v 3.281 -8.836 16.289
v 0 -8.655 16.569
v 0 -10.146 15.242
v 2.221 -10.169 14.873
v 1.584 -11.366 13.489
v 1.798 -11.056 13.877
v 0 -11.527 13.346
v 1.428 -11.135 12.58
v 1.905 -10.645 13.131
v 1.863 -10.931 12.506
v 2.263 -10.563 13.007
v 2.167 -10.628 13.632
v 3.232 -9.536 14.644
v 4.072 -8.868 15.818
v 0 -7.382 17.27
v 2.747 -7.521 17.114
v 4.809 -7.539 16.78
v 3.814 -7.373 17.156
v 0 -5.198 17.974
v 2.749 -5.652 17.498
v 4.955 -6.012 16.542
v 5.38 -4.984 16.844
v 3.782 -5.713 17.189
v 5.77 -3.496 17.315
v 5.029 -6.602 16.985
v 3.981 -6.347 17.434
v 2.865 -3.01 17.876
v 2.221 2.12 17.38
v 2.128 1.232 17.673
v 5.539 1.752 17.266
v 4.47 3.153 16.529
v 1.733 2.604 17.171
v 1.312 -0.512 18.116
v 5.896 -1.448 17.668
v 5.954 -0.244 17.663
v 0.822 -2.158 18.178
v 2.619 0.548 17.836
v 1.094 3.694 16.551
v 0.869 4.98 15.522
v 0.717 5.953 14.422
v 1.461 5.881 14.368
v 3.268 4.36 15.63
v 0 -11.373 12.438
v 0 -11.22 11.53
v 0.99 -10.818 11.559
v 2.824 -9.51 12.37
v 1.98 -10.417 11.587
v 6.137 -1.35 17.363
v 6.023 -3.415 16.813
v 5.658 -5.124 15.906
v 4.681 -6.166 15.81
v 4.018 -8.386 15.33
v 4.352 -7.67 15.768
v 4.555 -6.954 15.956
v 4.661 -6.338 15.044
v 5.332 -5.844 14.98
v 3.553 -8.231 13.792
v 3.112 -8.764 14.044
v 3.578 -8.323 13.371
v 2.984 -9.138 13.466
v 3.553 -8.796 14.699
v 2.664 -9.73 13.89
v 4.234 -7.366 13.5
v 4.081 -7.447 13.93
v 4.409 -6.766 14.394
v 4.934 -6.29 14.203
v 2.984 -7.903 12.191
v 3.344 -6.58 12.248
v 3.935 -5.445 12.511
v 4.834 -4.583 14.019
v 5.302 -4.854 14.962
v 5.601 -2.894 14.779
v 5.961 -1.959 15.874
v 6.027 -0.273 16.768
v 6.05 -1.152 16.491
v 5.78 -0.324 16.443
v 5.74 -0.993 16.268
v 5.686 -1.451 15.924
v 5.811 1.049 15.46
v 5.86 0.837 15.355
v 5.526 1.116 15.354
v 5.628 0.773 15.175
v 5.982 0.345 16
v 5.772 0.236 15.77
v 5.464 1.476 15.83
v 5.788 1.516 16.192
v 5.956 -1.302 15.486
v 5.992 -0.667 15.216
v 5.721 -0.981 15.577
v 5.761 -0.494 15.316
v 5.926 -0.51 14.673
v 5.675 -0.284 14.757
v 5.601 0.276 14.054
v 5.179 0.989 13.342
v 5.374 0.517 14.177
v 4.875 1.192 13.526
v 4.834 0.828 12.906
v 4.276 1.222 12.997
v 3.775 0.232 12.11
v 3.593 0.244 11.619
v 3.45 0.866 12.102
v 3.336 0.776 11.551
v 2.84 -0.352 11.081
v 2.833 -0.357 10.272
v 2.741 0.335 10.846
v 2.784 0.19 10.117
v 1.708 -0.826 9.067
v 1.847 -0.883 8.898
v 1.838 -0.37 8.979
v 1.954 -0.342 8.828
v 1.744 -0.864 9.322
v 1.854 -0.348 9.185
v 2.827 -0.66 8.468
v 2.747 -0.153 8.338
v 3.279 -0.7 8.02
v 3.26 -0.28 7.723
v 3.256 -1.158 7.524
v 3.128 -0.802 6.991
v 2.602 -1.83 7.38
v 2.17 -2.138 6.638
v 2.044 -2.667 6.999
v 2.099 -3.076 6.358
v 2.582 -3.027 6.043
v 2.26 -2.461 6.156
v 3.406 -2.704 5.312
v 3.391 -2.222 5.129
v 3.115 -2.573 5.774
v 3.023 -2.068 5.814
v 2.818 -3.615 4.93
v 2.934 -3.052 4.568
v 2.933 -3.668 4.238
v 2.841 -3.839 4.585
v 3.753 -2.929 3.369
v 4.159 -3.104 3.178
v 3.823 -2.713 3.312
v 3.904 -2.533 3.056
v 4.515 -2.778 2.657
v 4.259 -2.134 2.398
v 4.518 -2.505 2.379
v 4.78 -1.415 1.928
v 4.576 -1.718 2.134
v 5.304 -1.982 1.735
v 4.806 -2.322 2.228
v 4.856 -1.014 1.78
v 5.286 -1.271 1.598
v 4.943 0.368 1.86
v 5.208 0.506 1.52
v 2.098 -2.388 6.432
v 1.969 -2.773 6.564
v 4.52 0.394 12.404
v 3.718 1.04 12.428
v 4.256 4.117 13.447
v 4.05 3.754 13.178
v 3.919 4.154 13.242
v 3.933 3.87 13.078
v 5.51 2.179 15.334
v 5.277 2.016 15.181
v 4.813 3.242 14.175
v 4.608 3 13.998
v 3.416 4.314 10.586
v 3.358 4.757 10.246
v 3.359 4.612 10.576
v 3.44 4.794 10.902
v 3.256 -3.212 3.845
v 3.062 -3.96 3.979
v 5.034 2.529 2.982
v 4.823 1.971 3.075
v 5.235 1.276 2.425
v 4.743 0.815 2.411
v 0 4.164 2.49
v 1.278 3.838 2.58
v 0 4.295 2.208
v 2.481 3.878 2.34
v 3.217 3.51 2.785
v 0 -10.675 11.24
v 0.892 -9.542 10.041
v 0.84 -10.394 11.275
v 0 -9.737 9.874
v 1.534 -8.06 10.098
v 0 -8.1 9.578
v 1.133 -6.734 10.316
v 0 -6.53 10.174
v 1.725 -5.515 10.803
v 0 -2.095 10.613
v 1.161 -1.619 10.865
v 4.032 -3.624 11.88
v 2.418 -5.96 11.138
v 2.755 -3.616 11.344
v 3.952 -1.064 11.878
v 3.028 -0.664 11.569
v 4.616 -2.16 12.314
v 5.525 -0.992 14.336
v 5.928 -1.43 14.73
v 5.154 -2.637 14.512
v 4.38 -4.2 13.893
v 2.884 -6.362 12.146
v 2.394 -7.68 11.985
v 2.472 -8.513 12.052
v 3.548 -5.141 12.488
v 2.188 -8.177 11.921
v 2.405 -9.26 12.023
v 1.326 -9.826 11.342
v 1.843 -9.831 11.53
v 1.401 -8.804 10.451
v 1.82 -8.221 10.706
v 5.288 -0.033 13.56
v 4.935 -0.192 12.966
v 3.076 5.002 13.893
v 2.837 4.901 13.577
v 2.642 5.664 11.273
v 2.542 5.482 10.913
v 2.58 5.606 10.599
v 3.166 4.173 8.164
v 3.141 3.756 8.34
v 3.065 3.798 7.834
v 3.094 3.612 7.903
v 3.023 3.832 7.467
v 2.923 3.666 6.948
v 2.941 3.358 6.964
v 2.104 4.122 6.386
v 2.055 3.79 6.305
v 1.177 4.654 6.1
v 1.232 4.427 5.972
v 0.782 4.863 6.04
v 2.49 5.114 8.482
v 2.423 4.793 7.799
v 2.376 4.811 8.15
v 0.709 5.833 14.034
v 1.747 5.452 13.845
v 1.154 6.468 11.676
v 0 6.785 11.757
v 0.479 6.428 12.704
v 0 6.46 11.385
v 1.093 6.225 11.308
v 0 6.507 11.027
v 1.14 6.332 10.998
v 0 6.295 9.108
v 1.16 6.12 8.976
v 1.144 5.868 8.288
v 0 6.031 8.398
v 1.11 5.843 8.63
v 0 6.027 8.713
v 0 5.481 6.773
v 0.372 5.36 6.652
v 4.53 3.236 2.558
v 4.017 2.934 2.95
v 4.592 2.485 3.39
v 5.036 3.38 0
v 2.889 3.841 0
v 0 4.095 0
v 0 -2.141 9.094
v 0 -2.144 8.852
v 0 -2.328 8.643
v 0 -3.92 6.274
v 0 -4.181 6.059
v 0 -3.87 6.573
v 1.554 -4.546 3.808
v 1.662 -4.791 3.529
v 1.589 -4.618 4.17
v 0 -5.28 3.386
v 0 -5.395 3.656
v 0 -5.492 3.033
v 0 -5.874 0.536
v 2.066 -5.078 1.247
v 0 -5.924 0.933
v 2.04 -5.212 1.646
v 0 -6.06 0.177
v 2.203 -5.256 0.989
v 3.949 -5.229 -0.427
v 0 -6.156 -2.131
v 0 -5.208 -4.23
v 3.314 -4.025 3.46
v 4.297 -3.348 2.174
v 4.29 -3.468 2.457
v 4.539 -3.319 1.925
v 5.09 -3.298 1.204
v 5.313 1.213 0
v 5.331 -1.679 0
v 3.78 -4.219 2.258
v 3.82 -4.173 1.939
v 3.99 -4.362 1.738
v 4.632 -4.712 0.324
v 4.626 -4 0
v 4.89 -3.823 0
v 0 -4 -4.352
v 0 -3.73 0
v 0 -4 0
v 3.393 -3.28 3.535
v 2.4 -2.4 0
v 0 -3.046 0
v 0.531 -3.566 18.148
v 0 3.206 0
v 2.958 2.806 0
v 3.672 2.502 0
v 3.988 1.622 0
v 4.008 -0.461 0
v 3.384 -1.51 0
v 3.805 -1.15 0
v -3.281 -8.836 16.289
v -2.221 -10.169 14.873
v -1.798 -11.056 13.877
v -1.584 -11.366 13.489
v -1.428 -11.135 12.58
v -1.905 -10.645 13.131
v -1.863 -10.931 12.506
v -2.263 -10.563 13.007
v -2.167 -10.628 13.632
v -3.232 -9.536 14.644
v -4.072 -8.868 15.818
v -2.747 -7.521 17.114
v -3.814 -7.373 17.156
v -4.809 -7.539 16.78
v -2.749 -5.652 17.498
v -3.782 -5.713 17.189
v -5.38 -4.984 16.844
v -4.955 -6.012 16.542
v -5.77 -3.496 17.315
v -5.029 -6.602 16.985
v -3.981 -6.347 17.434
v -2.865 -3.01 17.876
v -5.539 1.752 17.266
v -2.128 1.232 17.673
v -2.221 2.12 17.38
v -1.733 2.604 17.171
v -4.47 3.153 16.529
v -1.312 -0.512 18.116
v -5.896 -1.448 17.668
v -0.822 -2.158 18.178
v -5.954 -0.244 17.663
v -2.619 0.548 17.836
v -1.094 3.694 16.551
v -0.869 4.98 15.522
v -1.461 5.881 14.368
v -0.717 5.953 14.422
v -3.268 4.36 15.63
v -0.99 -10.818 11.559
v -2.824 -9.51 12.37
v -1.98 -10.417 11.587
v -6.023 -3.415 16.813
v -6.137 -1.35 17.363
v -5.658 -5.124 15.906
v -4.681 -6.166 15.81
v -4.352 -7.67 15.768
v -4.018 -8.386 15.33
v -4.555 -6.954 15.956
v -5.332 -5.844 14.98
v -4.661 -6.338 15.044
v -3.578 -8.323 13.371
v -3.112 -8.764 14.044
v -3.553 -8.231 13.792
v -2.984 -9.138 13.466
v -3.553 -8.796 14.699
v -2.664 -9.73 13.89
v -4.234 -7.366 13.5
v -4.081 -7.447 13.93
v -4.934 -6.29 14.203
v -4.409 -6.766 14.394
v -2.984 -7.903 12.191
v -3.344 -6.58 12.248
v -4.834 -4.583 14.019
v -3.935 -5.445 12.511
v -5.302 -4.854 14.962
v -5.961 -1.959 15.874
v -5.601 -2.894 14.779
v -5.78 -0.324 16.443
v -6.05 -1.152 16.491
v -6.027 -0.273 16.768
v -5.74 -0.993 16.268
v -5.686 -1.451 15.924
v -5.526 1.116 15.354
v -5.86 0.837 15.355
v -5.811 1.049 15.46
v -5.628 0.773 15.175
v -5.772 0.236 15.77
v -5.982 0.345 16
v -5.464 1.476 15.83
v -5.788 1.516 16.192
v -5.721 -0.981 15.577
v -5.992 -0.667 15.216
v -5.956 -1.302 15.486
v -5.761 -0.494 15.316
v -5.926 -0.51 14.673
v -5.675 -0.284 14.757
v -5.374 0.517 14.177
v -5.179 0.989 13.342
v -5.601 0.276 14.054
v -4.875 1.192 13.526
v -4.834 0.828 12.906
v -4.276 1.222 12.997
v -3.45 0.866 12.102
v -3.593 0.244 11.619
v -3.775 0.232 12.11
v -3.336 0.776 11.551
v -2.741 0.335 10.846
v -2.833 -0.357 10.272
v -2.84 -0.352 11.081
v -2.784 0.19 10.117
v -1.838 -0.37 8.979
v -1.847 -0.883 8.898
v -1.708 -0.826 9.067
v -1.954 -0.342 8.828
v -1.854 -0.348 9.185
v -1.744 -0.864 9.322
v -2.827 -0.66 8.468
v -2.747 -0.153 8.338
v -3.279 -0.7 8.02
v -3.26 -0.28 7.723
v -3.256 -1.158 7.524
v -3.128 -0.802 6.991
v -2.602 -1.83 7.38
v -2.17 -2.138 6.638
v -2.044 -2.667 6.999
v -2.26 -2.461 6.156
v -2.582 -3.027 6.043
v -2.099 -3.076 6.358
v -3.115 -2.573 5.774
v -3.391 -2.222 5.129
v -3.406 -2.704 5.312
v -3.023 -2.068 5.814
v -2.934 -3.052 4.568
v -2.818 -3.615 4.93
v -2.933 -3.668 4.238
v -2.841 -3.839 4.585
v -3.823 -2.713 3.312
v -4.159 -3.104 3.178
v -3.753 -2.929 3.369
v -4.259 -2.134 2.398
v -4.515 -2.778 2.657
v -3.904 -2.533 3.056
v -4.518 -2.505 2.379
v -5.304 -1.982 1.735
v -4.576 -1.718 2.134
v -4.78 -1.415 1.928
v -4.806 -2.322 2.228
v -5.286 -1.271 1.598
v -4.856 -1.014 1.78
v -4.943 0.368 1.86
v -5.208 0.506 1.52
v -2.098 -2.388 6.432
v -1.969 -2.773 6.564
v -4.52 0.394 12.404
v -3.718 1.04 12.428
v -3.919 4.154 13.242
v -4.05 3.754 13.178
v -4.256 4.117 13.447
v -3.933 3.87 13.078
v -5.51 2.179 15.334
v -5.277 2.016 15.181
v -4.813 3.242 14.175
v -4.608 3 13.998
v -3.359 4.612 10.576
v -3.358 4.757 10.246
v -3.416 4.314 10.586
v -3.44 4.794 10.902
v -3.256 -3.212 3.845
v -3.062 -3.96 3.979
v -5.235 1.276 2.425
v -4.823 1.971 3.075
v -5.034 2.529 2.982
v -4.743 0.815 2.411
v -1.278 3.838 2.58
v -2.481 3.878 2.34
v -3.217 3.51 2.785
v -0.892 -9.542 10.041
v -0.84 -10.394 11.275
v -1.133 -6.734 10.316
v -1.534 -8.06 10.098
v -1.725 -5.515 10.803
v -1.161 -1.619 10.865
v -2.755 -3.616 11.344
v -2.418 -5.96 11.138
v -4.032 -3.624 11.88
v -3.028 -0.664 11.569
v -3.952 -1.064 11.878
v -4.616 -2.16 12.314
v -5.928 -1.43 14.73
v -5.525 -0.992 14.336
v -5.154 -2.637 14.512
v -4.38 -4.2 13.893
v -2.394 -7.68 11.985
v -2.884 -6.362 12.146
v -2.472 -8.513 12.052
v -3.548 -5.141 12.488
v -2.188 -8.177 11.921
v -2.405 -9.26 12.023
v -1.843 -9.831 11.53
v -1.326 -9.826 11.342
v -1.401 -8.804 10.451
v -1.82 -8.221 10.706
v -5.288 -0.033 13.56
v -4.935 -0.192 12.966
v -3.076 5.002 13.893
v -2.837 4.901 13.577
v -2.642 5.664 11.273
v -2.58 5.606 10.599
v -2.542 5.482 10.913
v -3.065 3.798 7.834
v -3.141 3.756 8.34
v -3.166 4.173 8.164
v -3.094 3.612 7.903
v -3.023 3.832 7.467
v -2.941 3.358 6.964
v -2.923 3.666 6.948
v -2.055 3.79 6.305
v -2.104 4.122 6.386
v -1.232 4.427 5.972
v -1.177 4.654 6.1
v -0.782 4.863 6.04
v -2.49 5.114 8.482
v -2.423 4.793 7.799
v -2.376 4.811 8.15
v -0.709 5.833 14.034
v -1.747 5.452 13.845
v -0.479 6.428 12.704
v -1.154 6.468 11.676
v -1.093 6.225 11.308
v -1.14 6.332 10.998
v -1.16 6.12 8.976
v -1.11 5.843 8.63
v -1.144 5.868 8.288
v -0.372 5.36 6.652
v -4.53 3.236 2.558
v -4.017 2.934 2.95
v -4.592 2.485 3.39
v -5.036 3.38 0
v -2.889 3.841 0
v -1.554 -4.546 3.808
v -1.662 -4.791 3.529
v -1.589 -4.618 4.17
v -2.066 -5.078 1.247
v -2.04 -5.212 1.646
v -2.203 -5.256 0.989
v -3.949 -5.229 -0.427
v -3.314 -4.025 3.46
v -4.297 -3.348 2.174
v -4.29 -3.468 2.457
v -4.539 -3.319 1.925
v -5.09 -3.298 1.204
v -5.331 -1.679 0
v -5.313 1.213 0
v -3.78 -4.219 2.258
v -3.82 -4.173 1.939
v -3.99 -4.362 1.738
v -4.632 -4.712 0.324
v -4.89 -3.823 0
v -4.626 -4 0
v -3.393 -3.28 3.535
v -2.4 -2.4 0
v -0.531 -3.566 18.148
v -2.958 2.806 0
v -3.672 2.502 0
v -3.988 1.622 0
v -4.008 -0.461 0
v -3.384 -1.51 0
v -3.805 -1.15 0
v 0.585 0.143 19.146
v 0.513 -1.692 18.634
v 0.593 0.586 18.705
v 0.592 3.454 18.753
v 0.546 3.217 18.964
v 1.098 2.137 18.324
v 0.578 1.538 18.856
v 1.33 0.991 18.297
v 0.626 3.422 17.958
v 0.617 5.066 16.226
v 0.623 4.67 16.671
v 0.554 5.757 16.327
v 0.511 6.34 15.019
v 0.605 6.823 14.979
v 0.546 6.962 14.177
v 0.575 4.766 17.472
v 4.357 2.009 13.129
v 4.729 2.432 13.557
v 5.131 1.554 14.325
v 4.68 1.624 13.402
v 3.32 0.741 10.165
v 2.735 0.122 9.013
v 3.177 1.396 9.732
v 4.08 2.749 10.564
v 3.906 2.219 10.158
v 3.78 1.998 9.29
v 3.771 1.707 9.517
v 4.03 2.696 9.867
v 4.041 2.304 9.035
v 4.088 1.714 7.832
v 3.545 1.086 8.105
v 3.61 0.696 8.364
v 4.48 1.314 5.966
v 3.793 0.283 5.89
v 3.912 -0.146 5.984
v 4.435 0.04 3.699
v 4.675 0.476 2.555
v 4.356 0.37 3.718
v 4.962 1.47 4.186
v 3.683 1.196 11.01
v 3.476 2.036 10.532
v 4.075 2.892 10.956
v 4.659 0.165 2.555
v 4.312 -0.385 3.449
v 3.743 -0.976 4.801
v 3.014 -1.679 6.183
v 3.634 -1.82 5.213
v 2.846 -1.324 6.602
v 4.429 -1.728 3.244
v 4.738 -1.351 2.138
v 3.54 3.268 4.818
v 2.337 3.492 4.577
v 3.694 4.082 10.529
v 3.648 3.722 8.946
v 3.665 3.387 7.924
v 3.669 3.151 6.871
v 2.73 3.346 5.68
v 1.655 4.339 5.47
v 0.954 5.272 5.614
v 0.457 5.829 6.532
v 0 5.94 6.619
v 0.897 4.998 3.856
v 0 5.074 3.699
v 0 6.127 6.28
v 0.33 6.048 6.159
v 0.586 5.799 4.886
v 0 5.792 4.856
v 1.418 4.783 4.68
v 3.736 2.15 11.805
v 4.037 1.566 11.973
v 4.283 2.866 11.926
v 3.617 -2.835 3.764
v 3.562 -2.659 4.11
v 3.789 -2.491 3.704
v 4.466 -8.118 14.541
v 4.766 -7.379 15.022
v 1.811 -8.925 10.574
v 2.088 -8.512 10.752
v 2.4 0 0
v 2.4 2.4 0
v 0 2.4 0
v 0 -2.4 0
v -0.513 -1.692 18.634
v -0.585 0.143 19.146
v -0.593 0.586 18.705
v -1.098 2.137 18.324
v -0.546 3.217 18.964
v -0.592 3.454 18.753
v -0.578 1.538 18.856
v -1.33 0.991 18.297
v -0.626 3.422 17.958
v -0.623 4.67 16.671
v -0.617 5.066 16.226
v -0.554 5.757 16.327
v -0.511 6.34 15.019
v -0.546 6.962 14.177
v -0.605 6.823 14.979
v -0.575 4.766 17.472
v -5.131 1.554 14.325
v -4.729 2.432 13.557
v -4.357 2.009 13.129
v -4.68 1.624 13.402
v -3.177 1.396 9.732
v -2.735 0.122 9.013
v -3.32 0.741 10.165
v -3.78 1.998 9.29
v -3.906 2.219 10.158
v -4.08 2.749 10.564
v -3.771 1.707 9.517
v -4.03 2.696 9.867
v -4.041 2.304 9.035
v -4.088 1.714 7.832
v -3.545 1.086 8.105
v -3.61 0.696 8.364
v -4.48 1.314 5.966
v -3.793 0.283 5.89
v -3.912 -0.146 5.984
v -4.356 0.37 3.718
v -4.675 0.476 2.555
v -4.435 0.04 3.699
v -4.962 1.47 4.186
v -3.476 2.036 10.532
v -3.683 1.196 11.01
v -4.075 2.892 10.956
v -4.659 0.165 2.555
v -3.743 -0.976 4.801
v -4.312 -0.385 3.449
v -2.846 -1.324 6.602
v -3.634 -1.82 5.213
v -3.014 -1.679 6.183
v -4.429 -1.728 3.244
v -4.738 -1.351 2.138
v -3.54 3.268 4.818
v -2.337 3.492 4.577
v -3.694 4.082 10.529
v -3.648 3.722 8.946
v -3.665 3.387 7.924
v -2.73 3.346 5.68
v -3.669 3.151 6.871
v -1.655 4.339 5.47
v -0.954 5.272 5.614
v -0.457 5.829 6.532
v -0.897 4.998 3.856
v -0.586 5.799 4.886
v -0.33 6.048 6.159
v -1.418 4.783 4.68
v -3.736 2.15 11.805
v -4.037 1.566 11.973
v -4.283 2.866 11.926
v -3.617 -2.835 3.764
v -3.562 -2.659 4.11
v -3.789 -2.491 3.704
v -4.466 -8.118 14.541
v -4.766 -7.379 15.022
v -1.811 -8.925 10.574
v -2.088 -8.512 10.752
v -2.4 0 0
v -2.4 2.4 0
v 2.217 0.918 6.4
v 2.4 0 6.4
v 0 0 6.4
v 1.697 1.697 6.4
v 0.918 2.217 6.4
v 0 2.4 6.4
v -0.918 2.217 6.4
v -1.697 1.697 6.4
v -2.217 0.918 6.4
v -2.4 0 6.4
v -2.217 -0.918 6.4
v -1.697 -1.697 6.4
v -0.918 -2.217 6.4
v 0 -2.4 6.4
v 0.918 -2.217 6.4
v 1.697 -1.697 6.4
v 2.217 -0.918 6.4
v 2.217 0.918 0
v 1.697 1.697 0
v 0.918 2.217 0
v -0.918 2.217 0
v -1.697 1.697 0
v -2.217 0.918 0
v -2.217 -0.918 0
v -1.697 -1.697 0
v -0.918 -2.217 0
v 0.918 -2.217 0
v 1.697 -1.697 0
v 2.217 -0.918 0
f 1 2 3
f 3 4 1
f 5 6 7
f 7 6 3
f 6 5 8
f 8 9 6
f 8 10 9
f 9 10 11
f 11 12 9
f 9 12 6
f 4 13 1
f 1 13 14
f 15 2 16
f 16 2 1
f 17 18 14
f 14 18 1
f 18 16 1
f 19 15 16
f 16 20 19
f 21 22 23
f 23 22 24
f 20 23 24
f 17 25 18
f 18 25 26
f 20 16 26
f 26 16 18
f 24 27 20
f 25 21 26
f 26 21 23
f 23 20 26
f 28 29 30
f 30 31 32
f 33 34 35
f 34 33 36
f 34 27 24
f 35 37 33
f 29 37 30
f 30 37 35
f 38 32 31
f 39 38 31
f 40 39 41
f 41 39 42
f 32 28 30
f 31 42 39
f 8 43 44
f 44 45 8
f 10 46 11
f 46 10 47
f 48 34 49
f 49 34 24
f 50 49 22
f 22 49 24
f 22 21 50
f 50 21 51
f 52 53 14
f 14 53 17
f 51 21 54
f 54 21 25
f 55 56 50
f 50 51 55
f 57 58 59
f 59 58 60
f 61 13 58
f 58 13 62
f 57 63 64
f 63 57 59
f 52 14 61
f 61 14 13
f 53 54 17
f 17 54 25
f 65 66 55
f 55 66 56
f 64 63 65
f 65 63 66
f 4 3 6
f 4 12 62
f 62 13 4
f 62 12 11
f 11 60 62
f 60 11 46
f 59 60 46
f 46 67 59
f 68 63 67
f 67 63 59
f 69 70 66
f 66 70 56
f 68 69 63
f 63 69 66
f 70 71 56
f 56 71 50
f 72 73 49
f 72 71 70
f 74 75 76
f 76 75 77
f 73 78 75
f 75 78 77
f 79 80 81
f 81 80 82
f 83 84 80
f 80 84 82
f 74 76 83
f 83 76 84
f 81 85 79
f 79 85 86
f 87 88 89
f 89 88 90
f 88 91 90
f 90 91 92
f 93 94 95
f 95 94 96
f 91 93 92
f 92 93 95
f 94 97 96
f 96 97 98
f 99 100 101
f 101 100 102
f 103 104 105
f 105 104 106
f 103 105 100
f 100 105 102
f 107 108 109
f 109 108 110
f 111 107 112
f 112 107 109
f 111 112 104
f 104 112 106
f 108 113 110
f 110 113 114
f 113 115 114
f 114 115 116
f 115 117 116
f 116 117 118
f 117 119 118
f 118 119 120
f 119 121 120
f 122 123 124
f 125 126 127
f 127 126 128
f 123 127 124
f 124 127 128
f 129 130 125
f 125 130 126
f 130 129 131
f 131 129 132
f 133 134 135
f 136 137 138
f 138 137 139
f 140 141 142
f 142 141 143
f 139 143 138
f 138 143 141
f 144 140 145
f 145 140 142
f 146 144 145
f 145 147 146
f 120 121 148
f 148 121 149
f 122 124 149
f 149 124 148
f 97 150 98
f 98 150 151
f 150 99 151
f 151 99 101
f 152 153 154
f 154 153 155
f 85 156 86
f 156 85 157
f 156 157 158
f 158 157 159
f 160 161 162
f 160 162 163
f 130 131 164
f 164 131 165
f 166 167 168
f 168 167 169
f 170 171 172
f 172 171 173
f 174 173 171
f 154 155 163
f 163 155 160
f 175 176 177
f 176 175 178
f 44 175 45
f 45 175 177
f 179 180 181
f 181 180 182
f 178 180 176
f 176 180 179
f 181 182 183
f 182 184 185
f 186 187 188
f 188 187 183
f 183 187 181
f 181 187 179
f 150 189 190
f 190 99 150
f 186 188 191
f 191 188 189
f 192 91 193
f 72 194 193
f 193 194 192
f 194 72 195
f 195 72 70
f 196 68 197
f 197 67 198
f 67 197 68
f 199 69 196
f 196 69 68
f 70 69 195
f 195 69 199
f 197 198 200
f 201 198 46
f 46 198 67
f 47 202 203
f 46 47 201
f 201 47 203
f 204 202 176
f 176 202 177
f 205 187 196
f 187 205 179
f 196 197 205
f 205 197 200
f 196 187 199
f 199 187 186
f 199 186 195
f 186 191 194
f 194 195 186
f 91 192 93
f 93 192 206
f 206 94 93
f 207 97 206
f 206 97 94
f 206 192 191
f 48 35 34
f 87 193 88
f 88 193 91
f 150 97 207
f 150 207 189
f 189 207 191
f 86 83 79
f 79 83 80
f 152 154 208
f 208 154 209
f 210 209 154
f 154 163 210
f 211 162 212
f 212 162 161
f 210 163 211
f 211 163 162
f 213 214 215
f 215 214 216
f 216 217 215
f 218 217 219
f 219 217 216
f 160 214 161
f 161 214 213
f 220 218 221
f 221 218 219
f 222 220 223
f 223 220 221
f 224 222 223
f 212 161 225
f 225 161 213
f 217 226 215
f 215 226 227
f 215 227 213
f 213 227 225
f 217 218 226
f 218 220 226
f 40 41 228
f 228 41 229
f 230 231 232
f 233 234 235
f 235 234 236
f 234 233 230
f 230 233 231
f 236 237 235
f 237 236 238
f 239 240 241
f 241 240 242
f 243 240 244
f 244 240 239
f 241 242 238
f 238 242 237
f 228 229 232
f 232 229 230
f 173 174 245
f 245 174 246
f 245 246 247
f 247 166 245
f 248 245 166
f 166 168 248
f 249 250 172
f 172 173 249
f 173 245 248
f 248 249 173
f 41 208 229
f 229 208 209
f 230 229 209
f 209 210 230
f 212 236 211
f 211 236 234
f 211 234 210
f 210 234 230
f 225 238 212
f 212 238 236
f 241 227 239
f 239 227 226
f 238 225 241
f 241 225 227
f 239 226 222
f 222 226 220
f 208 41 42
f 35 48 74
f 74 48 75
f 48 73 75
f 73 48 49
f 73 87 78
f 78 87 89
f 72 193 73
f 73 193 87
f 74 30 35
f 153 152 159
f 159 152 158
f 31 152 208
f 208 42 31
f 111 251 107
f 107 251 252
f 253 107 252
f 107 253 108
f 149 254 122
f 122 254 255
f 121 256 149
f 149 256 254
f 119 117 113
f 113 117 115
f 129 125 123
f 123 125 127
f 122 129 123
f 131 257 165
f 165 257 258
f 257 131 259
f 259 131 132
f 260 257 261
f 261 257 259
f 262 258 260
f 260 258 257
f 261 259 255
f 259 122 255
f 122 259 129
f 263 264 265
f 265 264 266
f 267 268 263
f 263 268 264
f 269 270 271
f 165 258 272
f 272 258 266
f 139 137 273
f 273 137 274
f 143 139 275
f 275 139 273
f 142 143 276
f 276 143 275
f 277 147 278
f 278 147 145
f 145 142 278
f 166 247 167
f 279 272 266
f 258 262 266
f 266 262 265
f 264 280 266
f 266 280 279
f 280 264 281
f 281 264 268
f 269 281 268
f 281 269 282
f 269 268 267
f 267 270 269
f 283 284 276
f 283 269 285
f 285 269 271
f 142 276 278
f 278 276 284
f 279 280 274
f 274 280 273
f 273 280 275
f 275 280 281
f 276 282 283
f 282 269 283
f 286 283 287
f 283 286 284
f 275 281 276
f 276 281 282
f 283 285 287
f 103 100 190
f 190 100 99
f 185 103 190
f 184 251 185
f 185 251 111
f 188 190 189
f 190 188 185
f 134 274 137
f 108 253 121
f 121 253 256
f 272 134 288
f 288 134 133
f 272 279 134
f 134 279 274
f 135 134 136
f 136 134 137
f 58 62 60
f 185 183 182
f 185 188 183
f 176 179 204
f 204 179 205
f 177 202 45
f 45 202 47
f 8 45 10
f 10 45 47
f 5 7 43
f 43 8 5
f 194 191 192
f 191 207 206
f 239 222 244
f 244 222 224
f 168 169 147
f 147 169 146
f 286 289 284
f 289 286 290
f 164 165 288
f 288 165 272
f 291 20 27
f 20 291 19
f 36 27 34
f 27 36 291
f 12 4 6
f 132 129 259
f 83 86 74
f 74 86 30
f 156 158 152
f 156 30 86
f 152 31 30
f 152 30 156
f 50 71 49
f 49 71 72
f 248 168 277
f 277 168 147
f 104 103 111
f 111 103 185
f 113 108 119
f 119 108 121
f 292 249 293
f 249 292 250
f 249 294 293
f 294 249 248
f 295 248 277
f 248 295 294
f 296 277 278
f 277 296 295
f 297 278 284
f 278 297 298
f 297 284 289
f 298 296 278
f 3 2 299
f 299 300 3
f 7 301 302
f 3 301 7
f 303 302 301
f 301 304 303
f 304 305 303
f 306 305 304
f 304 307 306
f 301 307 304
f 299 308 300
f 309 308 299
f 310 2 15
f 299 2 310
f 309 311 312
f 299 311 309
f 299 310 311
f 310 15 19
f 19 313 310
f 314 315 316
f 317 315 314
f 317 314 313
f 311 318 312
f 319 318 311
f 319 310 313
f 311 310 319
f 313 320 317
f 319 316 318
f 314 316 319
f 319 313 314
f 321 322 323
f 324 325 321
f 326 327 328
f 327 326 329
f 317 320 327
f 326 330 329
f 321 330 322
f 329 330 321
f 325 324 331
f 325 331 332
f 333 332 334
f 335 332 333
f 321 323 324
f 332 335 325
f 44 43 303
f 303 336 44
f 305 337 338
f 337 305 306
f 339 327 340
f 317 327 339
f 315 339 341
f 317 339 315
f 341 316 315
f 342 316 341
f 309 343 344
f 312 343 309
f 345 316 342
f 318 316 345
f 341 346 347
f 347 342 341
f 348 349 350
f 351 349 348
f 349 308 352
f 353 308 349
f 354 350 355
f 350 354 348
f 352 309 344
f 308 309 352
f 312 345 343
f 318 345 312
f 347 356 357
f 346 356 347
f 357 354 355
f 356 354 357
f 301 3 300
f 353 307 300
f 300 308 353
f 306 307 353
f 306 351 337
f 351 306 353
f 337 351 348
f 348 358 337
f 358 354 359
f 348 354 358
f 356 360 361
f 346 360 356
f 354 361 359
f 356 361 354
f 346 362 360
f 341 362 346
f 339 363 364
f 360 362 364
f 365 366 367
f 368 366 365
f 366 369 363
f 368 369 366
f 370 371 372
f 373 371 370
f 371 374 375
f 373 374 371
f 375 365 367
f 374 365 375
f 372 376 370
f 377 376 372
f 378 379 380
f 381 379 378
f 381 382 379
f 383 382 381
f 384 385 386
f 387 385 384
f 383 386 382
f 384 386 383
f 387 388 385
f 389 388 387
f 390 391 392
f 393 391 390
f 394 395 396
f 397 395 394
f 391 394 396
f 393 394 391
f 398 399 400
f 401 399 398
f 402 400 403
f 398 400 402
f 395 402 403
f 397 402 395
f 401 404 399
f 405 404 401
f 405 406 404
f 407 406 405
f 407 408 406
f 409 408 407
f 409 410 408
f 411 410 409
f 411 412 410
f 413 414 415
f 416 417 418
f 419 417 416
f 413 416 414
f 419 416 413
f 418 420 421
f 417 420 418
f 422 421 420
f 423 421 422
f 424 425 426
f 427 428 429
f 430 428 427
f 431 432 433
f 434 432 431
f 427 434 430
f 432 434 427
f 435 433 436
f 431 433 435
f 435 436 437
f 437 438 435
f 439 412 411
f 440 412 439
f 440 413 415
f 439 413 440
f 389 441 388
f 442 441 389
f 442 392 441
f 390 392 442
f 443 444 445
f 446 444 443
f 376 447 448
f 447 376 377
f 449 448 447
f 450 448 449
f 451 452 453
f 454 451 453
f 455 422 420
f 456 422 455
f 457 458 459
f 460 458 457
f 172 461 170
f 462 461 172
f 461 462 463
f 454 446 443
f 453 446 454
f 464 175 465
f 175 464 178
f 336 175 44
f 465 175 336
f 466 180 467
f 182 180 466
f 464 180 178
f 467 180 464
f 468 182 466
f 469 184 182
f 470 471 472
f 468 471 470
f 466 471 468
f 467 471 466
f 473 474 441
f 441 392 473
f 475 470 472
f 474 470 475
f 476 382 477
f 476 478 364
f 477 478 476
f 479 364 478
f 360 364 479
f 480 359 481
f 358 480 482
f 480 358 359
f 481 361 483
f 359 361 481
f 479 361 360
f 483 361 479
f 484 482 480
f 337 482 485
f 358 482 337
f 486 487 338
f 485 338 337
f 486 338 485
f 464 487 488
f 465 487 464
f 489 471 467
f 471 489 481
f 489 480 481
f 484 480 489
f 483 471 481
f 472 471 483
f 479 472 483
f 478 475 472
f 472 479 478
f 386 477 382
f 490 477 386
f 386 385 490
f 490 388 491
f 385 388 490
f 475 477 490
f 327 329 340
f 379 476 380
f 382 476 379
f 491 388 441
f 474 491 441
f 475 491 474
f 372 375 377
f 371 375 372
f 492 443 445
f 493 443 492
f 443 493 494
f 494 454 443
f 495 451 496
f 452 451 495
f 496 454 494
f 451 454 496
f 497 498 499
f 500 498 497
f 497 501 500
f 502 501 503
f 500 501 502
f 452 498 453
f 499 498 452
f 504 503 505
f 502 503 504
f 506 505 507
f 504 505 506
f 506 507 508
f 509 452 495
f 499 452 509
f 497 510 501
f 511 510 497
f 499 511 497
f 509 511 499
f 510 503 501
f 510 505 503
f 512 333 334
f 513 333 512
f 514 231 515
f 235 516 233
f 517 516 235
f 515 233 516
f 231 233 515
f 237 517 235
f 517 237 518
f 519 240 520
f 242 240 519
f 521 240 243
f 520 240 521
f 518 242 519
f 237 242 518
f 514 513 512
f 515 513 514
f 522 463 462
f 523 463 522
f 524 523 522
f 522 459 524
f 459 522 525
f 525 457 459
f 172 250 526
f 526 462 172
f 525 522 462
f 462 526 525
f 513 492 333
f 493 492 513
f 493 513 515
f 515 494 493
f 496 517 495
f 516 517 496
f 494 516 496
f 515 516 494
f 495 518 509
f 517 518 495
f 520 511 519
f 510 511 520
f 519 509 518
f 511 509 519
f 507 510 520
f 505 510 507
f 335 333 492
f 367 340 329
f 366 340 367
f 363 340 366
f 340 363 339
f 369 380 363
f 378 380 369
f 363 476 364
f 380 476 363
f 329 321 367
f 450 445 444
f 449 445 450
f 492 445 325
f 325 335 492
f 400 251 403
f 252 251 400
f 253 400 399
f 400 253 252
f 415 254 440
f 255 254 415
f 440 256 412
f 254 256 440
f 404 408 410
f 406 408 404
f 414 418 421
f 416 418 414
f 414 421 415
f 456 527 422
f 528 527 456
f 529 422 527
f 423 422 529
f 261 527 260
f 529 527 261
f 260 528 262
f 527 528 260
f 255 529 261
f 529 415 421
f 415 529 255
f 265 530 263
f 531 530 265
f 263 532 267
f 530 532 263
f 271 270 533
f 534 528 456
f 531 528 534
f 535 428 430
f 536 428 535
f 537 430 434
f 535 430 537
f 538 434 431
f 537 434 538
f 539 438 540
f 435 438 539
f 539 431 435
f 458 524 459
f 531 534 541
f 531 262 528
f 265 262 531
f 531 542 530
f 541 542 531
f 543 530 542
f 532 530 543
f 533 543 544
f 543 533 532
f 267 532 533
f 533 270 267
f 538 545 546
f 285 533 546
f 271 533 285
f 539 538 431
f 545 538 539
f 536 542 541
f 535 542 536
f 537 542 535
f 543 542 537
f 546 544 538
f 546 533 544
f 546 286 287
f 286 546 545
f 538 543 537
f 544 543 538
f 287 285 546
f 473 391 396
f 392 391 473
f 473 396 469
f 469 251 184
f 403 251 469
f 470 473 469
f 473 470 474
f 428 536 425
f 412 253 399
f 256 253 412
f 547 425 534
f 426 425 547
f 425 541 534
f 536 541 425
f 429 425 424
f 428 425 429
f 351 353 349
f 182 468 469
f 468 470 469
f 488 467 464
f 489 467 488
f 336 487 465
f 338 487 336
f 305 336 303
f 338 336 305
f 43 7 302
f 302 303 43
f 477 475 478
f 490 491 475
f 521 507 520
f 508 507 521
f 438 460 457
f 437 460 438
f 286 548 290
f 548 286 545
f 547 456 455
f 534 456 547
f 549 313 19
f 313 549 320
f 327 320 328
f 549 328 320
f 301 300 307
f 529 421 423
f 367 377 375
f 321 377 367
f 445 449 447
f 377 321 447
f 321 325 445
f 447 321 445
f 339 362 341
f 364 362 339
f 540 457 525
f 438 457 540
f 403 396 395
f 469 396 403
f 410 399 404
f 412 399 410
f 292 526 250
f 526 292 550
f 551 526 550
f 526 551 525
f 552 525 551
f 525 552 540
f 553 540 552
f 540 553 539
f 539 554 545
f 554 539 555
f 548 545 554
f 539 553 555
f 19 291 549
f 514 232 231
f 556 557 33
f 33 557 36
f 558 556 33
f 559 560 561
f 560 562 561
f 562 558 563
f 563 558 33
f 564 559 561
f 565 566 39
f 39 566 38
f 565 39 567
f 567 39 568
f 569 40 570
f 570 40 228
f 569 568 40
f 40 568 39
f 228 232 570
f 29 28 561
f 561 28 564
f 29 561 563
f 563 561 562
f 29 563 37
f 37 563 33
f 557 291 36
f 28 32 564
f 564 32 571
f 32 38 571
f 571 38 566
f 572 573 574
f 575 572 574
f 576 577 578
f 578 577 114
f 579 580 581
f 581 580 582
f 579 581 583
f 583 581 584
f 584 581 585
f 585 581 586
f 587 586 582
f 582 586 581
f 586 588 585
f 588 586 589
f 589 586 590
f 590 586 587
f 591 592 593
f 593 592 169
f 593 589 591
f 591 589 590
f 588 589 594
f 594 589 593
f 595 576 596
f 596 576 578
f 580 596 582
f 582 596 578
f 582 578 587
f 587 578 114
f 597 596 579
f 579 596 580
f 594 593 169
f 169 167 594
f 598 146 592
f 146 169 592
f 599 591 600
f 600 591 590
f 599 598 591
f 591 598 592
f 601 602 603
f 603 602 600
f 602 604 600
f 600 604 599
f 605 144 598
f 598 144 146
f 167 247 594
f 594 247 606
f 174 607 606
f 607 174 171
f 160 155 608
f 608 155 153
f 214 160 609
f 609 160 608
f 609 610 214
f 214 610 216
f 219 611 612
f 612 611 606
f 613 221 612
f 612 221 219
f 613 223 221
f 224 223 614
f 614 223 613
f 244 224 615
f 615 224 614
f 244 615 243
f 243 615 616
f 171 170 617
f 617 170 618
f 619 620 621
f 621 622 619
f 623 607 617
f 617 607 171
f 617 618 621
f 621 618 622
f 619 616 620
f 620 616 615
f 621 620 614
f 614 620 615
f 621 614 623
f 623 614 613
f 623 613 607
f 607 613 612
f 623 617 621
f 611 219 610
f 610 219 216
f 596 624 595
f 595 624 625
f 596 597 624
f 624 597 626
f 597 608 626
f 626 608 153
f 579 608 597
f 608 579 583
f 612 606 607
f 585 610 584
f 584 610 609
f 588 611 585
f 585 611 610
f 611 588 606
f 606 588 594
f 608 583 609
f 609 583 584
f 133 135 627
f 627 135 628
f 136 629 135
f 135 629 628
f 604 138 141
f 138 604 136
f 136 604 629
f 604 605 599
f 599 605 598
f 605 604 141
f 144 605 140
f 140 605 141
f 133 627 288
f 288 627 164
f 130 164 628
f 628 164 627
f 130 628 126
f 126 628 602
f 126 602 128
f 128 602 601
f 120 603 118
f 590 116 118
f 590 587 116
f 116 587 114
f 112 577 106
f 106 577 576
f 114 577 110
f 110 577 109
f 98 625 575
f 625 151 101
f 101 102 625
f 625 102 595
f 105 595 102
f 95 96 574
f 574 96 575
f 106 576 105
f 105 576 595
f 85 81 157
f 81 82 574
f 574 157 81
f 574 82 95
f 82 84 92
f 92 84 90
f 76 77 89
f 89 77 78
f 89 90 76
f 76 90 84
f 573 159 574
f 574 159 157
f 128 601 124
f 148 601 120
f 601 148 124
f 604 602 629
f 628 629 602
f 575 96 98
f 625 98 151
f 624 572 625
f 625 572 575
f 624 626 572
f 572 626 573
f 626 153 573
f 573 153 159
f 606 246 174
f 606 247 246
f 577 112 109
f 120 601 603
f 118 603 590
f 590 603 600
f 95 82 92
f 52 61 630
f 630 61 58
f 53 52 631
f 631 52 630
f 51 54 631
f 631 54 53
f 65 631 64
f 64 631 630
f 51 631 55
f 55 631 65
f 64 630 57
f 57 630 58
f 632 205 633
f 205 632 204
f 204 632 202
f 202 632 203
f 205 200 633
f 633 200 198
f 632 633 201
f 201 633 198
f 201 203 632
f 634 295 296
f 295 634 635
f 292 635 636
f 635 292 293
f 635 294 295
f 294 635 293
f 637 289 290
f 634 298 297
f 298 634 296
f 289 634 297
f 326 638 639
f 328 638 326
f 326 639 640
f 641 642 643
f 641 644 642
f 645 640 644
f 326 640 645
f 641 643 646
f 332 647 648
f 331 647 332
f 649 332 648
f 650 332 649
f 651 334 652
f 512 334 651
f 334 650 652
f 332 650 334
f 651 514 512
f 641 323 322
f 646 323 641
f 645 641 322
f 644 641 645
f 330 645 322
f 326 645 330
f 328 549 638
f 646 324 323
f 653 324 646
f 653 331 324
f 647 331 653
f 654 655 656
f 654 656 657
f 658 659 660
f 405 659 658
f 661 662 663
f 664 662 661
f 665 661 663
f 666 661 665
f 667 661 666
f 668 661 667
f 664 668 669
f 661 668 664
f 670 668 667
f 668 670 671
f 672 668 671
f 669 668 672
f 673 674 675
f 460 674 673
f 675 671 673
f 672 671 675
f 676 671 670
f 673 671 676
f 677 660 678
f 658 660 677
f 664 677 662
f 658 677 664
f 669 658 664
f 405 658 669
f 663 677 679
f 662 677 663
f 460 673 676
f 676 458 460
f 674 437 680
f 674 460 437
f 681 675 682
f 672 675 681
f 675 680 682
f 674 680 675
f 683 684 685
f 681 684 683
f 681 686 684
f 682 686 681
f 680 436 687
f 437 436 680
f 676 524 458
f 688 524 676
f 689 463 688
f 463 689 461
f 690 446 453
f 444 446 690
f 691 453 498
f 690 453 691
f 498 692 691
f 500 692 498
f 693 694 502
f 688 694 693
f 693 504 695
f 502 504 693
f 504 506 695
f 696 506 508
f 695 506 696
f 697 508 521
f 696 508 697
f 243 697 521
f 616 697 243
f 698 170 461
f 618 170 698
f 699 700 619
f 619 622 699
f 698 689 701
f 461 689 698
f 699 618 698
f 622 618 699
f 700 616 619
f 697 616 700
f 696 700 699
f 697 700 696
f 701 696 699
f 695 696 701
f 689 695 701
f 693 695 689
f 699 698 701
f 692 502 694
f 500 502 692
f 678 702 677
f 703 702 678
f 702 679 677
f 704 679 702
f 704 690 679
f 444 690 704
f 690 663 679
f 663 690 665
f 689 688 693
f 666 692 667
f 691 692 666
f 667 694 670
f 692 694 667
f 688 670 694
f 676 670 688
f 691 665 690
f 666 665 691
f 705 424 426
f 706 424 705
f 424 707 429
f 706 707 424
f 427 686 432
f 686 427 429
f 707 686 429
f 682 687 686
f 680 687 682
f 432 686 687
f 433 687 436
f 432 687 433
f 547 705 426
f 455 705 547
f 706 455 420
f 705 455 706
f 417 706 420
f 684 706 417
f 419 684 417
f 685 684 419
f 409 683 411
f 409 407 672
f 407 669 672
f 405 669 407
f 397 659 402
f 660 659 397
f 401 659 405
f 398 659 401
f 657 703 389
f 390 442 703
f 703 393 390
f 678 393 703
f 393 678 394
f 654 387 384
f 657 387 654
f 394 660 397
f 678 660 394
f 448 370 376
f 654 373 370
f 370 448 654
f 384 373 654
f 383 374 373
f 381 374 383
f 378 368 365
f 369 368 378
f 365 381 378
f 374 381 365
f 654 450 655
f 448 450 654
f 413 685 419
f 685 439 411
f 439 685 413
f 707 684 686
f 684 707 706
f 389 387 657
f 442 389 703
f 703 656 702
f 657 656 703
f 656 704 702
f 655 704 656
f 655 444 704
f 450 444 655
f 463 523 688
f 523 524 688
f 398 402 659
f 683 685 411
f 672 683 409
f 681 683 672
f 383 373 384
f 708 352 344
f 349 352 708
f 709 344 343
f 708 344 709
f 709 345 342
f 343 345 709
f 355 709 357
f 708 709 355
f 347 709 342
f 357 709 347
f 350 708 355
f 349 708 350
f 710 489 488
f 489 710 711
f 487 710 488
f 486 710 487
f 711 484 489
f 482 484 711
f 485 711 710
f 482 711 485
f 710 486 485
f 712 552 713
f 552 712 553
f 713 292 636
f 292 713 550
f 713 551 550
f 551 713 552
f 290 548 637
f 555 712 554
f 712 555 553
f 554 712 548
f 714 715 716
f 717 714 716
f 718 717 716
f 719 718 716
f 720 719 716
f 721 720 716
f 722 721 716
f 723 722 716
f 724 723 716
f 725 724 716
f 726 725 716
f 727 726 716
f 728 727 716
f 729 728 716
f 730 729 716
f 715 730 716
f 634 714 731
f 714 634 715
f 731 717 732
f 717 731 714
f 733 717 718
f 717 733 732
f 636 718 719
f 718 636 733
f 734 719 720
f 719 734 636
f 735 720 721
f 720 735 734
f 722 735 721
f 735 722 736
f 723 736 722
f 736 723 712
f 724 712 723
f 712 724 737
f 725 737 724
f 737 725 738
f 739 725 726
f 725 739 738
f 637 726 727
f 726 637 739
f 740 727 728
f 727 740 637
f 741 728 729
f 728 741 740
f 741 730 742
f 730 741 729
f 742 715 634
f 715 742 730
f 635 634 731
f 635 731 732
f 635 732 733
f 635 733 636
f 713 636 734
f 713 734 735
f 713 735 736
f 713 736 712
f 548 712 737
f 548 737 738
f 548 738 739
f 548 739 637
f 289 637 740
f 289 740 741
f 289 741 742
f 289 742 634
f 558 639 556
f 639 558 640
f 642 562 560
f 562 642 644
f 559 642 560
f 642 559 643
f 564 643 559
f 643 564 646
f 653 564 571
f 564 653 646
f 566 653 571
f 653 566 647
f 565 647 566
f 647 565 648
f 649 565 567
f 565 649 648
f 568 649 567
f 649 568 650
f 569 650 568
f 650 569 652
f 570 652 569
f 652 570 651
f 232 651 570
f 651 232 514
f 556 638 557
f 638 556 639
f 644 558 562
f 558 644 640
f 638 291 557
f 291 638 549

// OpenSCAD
use <../lib.scad>
use <s/49588s01.scad>
use <s/49588s03.scad>
function ldraw_lib__49588p02() = [
// 0 Minifig Head Snake with Closed Mouth with Dark Turquoise Flames and Eyes Pattern
// 0 Name: 49588p02.dat
// 0 Author: Philippe Hurbain [Philo]
// 0 !LDRAW_ORG Part UPDATE 2023-04
// 0 !LICENSE Licensed under CC BY 4.0 : see CAreadme.txt
// 
// 0 BFC CERTIFY CCW
  [0,"BFC","CERTIFY"],
  [0,"BFC","CCW"],
// 
// 0 !KEYWORDS Bricklink 49588pb02, Ninjago, Rebrickable 49588pat0002, Set 71750
// 
// 0 !HISTORY 2023-08-25 [OrionP] Official Update 2023-04
// 
// 
// 1 16 0 0 0 1 0 0 0 1 0 0 0 1 s\49588s01.dat
  [1,16,0,0,0,1,0,0,0,1,0,0,0,1, ldraw_lib__s__49588s01()],
// 1 3 0 0 0 1 0 0 0 1 0 0 0 1 s\49588s03.dat
  [1,3,0,0,0,1,0,0,0,1,0,0,0,1, ldraw_lib__s__49588s03()],
];
module ldraw_lib__49588p02(step=0, col=false, unit=2/5, alt=false, line=0.2, solid=!$preview)
    makepoly(ldraw_lib__49588p02(), step=step, col=col, unit=unit, alt=alt, line=line, solid=solid);
ldraw_lib__49588p02(line=0.2);
